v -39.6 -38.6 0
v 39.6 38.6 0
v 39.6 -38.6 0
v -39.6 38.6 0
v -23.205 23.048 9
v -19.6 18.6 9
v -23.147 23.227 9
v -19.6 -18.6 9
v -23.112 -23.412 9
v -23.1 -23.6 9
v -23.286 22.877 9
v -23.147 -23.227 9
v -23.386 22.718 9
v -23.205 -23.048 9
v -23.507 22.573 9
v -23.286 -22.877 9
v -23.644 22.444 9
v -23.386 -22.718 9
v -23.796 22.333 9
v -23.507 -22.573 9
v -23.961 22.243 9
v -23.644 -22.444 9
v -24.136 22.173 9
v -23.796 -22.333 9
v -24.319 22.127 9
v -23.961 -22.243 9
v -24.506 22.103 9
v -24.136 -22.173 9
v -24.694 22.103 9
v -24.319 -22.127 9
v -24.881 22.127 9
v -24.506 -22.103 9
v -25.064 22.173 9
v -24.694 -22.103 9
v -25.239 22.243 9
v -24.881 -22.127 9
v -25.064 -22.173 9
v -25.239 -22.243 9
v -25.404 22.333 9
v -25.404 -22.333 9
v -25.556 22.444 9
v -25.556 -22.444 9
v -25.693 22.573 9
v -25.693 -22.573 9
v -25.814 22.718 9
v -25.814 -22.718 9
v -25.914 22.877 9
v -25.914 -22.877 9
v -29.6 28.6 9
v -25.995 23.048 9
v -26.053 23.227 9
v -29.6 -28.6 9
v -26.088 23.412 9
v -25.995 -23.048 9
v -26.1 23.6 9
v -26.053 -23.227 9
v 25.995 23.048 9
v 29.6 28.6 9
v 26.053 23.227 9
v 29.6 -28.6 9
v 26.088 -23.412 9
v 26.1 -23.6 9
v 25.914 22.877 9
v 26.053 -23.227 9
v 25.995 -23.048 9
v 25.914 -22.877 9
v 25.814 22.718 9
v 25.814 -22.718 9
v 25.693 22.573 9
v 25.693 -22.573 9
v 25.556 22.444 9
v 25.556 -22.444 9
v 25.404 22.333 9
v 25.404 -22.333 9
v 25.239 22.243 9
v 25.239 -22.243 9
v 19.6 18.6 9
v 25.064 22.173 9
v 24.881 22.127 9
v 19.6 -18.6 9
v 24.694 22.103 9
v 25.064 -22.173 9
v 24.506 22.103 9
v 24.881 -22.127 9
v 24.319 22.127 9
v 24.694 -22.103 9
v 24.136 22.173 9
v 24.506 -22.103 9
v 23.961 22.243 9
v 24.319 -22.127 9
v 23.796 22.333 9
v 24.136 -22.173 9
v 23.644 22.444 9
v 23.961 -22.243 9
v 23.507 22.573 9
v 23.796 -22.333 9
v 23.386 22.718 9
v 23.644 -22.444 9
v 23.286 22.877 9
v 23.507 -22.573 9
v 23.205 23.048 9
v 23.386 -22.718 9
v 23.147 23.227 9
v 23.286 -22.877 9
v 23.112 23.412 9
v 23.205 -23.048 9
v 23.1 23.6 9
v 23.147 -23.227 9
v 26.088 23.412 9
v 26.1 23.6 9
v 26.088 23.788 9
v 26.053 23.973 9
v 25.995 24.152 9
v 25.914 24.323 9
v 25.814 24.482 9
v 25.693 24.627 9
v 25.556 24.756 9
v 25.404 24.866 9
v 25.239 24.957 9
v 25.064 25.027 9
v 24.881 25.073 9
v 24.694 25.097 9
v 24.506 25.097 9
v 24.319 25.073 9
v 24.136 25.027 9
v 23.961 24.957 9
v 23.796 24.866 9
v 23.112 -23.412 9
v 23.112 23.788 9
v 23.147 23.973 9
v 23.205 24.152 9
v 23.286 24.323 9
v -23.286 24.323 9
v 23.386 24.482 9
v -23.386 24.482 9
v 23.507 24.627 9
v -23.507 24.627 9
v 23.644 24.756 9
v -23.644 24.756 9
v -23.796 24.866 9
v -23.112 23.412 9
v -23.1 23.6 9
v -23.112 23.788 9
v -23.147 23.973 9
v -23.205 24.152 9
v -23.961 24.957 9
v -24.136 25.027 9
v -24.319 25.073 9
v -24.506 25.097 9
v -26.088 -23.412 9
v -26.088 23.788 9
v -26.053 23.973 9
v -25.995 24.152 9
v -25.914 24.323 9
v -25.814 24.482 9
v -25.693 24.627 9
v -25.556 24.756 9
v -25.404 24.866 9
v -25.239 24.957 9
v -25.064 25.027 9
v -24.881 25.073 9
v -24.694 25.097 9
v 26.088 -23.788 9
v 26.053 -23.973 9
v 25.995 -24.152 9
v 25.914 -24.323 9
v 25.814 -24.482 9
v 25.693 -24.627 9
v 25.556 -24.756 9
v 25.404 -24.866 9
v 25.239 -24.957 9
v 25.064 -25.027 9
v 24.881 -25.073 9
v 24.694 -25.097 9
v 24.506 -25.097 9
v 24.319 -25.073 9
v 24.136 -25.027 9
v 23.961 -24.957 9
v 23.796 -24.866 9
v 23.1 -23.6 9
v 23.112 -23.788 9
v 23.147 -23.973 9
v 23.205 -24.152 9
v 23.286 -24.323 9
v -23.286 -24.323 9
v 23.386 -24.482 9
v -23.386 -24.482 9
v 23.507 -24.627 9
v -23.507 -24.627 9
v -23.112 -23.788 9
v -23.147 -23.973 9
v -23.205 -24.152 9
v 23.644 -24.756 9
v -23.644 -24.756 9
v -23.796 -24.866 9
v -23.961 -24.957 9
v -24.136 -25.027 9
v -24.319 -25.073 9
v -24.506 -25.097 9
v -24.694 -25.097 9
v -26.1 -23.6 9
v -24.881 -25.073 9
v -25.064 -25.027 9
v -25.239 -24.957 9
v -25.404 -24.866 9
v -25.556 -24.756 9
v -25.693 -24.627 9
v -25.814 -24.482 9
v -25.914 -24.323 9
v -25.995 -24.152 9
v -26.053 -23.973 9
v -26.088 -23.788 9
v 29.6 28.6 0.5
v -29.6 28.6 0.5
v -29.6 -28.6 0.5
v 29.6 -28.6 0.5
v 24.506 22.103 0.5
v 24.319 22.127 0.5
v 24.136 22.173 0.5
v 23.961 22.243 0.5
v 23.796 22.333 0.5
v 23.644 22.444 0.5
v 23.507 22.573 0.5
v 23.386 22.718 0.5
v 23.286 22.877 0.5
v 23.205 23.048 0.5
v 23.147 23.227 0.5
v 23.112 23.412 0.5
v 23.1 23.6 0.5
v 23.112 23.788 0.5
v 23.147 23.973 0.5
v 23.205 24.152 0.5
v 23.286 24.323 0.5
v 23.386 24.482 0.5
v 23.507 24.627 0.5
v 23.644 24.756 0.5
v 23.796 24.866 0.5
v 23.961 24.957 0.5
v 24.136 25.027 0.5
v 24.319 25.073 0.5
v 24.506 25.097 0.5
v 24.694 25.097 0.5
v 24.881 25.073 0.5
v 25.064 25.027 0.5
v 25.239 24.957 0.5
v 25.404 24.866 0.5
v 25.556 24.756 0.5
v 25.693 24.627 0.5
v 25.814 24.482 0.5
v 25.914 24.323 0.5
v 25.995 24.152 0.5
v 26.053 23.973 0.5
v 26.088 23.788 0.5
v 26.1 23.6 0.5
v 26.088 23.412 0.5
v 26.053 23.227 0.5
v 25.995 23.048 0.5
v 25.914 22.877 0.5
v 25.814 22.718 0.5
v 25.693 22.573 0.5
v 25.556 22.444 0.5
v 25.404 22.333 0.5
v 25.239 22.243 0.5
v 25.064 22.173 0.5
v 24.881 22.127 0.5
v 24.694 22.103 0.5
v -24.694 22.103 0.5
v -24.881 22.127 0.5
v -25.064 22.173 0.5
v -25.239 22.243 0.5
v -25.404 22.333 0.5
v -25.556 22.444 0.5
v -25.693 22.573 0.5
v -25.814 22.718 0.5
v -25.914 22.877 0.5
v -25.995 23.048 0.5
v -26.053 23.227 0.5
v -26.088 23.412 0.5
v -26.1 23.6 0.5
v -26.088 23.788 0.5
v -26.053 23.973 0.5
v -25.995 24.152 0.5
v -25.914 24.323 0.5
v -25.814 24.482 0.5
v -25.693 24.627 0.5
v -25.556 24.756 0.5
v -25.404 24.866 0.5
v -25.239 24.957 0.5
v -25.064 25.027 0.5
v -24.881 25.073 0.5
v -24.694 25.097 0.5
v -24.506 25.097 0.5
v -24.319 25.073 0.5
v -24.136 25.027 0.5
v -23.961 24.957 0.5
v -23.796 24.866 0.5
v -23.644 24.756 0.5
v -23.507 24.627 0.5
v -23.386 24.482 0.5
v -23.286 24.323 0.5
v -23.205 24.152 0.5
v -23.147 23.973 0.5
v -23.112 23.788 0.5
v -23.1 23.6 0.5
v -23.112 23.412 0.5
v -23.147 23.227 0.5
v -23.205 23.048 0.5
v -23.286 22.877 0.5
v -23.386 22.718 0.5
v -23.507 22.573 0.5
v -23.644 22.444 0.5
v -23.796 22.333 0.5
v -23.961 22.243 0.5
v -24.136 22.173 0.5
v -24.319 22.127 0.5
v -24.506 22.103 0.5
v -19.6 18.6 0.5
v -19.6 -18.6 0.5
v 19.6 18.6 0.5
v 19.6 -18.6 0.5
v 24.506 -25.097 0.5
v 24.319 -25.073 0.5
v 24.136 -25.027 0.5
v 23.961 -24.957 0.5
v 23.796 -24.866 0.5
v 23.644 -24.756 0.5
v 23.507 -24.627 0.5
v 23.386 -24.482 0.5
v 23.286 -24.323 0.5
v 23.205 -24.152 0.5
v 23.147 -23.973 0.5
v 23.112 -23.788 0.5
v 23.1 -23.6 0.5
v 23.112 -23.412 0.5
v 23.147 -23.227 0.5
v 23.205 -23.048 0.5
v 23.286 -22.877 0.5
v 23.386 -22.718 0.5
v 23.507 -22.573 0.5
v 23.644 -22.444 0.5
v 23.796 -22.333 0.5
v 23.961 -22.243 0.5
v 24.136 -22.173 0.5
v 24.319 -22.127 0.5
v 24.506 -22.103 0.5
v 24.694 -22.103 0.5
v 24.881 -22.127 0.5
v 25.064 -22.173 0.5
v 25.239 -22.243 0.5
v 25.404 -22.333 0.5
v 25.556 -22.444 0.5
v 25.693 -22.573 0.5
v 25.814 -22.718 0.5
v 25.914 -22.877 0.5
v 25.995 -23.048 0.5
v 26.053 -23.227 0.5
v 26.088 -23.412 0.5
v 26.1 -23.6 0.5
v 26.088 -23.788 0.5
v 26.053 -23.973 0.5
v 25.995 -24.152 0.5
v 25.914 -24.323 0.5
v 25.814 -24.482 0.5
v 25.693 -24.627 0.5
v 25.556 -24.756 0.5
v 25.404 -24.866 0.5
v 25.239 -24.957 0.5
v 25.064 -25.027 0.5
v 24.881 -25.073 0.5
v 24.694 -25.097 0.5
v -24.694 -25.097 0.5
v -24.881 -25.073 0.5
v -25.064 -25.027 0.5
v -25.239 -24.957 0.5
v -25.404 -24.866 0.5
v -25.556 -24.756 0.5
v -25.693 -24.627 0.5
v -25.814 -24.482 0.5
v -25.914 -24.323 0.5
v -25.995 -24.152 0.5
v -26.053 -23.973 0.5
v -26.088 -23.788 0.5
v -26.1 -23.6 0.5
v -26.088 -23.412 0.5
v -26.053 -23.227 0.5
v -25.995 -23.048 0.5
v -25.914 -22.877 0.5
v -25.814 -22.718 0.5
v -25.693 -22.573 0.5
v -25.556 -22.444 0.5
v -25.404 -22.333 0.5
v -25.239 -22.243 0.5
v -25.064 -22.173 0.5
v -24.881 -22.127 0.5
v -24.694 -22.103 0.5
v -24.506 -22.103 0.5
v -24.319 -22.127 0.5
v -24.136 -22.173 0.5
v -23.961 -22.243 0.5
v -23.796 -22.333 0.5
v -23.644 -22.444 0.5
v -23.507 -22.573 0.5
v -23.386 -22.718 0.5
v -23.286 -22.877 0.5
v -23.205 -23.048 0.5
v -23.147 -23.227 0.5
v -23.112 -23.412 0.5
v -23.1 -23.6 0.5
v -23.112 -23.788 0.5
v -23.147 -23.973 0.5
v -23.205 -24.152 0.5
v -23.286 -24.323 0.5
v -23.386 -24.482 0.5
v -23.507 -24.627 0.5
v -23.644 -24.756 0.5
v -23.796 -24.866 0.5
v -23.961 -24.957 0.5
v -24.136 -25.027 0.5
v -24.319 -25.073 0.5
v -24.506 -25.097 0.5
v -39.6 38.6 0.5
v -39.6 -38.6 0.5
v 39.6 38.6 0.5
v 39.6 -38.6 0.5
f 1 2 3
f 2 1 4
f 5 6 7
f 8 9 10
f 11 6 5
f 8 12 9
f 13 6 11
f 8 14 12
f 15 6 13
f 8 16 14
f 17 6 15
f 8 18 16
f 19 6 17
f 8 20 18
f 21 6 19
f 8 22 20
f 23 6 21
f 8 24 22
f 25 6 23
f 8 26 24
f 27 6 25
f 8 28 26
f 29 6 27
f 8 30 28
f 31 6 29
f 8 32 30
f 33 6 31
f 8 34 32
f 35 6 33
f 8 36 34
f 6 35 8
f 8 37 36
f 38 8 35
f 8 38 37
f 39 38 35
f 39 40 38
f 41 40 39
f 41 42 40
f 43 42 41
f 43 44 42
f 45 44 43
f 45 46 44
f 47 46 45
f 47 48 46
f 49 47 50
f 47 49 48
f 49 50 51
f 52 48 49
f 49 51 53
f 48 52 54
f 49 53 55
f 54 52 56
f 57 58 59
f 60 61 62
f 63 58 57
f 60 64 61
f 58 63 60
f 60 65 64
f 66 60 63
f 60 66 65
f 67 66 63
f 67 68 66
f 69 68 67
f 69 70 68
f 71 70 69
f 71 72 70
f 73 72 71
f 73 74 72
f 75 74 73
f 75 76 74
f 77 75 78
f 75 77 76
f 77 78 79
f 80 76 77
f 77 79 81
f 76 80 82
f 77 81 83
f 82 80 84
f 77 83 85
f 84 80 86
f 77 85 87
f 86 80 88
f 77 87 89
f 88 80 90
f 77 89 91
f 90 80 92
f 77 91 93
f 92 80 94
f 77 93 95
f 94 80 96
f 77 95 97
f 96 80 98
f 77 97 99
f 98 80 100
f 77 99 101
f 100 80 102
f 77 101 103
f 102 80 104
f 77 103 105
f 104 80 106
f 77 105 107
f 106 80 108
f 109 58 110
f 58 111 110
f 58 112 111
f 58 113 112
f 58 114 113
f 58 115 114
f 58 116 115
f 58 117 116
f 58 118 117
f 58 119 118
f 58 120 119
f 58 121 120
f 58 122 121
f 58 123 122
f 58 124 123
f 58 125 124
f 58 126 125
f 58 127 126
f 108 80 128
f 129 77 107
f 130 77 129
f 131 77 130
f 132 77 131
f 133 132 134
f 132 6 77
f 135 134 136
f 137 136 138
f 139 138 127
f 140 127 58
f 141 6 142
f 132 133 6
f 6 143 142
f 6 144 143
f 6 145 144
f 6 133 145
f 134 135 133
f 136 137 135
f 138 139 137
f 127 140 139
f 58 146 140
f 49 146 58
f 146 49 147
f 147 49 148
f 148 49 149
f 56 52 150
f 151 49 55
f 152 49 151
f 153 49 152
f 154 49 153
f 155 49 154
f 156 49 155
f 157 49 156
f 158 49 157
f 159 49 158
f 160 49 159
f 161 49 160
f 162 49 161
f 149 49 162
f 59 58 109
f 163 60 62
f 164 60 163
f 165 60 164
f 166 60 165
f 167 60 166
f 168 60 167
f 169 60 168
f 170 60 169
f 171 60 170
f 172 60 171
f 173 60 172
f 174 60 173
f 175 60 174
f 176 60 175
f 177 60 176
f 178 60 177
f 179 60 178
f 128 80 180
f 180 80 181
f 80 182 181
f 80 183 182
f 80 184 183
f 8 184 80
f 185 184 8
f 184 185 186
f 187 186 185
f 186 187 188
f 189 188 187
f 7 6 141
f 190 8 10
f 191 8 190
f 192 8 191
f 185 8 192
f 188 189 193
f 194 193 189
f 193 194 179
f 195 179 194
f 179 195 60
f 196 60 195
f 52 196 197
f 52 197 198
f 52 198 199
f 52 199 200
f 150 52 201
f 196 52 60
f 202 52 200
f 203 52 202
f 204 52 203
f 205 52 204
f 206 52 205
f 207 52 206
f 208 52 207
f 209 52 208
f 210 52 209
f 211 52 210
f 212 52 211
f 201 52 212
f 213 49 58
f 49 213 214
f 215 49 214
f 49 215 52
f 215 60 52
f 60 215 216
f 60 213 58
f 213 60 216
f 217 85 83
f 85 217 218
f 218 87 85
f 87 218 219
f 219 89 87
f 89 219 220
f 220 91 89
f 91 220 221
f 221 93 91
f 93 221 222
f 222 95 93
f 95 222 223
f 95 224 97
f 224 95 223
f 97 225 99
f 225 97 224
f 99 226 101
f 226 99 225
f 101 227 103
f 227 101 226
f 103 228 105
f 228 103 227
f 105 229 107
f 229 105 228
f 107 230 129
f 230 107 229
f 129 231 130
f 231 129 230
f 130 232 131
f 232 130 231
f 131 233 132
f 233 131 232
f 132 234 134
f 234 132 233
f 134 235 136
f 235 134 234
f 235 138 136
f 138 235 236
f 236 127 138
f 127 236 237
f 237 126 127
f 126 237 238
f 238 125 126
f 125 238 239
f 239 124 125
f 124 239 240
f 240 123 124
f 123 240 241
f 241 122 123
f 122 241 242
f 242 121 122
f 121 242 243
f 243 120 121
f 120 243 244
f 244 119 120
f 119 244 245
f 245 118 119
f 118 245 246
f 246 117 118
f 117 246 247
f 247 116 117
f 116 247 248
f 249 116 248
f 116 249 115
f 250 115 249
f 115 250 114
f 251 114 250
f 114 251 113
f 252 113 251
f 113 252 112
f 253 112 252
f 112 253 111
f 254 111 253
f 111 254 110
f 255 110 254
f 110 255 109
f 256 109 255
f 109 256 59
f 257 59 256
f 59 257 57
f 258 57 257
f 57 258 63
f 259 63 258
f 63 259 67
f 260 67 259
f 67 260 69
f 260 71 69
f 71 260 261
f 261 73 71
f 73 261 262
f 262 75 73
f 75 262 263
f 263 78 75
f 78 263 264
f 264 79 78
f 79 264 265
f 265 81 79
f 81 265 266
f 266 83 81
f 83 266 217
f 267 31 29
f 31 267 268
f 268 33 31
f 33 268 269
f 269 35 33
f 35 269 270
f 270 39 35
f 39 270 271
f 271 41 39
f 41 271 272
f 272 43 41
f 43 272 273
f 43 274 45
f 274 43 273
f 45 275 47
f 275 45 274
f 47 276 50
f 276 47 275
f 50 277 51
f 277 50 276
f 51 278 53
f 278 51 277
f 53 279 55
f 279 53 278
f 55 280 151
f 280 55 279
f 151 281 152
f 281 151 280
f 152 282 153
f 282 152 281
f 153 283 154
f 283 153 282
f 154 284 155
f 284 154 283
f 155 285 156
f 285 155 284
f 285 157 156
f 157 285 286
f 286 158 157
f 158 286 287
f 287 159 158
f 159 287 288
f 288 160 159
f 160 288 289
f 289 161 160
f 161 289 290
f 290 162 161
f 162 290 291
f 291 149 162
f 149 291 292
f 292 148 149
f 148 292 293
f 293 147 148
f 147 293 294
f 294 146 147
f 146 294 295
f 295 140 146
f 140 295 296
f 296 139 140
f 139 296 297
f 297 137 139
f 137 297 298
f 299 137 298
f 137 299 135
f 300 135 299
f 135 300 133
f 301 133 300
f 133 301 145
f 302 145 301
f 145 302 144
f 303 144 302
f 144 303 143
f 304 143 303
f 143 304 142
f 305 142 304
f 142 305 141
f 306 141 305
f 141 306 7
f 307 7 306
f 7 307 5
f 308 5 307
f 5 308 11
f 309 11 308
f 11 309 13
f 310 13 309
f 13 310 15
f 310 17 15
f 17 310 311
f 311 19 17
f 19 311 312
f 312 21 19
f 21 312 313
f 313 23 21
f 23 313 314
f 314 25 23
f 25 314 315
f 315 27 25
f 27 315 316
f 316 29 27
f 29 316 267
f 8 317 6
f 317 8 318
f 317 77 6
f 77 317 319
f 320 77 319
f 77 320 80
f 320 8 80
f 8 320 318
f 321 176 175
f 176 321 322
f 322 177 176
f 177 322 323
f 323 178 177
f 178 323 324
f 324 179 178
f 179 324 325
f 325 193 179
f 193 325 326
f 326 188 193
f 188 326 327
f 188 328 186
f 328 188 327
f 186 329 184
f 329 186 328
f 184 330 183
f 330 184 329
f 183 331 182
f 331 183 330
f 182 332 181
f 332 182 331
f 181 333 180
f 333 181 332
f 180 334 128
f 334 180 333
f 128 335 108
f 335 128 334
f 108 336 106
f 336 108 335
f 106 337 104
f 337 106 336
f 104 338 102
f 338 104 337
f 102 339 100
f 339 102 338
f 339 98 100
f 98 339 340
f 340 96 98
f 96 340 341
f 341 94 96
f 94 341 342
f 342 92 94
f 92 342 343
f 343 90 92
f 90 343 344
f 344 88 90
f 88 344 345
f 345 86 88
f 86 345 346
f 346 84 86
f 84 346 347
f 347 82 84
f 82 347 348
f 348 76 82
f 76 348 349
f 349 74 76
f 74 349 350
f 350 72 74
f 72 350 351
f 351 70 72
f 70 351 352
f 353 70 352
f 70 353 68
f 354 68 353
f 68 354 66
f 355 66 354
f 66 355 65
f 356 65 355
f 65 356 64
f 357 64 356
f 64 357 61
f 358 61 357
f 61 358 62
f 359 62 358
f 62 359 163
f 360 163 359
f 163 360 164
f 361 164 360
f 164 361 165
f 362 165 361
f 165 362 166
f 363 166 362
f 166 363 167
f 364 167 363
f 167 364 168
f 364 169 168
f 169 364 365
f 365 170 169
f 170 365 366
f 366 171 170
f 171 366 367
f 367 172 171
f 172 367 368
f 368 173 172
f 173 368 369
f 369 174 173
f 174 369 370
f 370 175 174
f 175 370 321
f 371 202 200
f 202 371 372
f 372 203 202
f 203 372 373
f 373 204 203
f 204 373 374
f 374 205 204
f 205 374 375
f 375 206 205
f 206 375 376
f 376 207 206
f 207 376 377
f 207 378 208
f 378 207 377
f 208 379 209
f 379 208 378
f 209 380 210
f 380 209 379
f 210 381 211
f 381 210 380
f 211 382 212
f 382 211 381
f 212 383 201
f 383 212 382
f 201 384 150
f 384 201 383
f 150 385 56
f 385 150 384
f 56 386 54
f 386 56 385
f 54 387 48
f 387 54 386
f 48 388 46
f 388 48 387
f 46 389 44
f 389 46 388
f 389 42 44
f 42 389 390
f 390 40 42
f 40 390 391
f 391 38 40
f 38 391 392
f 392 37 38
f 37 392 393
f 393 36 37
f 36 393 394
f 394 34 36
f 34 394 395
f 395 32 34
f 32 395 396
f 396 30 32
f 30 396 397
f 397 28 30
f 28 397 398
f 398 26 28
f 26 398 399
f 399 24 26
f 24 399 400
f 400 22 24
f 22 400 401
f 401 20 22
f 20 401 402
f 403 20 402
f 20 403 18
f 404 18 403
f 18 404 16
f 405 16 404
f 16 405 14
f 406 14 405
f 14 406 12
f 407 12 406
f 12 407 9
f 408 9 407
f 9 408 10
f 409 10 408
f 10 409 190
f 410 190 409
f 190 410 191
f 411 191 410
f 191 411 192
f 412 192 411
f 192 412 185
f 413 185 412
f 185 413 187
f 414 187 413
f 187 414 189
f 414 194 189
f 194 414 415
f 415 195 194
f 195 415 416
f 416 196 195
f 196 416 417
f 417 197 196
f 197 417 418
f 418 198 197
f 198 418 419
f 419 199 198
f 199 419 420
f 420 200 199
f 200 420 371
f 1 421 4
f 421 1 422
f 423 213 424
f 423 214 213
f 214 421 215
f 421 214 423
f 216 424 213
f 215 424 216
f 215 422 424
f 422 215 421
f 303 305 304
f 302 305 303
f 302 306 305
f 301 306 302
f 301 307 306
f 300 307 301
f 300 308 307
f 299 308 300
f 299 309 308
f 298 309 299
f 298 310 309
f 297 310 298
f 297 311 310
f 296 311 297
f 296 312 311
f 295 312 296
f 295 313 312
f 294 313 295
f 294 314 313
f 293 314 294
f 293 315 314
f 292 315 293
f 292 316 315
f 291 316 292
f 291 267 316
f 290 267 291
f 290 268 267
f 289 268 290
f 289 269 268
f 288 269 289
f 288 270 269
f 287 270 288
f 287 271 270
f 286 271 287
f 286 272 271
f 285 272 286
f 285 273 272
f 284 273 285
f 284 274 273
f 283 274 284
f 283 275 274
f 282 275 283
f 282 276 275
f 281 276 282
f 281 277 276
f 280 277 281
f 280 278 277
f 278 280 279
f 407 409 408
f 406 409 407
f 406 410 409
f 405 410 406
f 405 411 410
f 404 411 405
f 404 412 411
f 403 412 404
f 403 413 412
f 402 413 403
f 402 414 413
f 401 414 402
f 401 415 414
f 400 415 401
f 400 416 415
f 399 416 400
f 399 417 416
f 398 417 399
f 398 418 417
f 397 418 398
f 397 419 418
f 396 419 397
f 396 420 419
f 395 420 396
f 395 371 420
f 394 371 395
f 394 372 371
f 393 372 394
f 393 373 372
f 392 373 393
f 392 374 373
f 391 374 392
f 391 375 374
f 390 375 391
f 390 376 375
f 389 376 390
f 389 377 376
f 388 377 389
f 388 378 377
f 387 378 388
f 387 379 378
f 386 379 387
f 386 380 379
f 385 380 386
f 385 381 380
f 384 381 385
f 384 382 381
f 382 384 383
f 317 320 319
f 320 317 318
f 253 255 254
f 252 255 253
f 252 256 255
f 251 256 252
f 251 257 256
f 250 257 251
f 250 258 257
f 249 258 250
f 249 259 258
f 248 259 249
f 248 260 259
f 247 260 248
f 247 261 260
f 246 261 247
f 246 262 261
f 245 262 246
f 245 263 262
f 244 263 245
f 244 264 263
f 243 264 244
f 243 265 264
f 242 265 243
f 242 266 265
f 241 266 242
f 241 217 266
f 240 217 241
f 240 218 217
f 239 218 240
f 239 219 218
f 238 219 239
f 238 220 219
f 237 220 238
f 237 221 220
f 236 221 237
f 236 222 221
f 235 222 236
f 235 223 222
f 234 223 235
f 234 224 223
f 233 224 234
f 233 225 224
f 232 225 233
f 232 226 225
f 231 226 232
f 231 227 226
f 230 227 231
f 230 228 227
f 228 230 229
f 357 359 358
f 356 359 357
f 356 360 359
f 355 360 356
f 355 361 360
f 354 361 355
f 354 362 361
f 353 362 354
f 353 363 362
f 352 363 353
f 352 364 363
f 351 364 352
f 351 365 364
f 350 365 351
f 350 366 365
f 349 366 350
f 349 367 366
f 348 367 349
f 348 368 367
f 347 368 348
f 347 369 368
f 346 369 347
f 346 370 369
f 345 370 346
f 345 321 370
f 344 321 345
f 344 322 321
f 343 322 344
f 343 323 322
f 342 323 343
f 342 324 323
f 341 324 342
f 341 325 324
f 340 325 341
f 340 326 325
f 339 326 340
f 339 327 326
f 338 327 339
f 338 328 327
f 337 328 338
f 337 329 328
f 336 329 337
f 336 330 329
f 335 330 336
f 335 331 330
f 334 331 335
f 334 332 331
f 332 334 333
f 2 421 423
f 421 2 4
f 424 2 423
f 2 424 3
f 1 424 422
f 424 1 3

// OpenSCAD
$fn = 50;

size = [23.5, 21.5];
distance = 7.85;
thickness = 20;
hole_d = 3;

linear_extrude(height=9)
difference() {
    square(
        [
            size.x + distance*2 + thickness,
            size.y + distance*2 + thickness
        ],
        center=true
    );
    square(
        [
            size.x + distance*2,
            size.y + distance*2
        ],
        center=true
    );
    for( i = [
        [1, 1],
        [1, -1],
        [-1, 1],
        [-1, -1],
    ]
    ) {
        translate(
            [
                i.x * ((size.x + distance*2 + thickness) / 2 - 5),
                i.y * ((size.y + distance*2 + thickness) / 2 - 5)
            ]
        )
        circle(d=hole_d);
    };
}

linear_extrude(height=0.5)
square(
    [
        size.x + distance*2 + 2*thickness,
        size.y + distance*2 + 2*thickness
    ],
    center=true
);
